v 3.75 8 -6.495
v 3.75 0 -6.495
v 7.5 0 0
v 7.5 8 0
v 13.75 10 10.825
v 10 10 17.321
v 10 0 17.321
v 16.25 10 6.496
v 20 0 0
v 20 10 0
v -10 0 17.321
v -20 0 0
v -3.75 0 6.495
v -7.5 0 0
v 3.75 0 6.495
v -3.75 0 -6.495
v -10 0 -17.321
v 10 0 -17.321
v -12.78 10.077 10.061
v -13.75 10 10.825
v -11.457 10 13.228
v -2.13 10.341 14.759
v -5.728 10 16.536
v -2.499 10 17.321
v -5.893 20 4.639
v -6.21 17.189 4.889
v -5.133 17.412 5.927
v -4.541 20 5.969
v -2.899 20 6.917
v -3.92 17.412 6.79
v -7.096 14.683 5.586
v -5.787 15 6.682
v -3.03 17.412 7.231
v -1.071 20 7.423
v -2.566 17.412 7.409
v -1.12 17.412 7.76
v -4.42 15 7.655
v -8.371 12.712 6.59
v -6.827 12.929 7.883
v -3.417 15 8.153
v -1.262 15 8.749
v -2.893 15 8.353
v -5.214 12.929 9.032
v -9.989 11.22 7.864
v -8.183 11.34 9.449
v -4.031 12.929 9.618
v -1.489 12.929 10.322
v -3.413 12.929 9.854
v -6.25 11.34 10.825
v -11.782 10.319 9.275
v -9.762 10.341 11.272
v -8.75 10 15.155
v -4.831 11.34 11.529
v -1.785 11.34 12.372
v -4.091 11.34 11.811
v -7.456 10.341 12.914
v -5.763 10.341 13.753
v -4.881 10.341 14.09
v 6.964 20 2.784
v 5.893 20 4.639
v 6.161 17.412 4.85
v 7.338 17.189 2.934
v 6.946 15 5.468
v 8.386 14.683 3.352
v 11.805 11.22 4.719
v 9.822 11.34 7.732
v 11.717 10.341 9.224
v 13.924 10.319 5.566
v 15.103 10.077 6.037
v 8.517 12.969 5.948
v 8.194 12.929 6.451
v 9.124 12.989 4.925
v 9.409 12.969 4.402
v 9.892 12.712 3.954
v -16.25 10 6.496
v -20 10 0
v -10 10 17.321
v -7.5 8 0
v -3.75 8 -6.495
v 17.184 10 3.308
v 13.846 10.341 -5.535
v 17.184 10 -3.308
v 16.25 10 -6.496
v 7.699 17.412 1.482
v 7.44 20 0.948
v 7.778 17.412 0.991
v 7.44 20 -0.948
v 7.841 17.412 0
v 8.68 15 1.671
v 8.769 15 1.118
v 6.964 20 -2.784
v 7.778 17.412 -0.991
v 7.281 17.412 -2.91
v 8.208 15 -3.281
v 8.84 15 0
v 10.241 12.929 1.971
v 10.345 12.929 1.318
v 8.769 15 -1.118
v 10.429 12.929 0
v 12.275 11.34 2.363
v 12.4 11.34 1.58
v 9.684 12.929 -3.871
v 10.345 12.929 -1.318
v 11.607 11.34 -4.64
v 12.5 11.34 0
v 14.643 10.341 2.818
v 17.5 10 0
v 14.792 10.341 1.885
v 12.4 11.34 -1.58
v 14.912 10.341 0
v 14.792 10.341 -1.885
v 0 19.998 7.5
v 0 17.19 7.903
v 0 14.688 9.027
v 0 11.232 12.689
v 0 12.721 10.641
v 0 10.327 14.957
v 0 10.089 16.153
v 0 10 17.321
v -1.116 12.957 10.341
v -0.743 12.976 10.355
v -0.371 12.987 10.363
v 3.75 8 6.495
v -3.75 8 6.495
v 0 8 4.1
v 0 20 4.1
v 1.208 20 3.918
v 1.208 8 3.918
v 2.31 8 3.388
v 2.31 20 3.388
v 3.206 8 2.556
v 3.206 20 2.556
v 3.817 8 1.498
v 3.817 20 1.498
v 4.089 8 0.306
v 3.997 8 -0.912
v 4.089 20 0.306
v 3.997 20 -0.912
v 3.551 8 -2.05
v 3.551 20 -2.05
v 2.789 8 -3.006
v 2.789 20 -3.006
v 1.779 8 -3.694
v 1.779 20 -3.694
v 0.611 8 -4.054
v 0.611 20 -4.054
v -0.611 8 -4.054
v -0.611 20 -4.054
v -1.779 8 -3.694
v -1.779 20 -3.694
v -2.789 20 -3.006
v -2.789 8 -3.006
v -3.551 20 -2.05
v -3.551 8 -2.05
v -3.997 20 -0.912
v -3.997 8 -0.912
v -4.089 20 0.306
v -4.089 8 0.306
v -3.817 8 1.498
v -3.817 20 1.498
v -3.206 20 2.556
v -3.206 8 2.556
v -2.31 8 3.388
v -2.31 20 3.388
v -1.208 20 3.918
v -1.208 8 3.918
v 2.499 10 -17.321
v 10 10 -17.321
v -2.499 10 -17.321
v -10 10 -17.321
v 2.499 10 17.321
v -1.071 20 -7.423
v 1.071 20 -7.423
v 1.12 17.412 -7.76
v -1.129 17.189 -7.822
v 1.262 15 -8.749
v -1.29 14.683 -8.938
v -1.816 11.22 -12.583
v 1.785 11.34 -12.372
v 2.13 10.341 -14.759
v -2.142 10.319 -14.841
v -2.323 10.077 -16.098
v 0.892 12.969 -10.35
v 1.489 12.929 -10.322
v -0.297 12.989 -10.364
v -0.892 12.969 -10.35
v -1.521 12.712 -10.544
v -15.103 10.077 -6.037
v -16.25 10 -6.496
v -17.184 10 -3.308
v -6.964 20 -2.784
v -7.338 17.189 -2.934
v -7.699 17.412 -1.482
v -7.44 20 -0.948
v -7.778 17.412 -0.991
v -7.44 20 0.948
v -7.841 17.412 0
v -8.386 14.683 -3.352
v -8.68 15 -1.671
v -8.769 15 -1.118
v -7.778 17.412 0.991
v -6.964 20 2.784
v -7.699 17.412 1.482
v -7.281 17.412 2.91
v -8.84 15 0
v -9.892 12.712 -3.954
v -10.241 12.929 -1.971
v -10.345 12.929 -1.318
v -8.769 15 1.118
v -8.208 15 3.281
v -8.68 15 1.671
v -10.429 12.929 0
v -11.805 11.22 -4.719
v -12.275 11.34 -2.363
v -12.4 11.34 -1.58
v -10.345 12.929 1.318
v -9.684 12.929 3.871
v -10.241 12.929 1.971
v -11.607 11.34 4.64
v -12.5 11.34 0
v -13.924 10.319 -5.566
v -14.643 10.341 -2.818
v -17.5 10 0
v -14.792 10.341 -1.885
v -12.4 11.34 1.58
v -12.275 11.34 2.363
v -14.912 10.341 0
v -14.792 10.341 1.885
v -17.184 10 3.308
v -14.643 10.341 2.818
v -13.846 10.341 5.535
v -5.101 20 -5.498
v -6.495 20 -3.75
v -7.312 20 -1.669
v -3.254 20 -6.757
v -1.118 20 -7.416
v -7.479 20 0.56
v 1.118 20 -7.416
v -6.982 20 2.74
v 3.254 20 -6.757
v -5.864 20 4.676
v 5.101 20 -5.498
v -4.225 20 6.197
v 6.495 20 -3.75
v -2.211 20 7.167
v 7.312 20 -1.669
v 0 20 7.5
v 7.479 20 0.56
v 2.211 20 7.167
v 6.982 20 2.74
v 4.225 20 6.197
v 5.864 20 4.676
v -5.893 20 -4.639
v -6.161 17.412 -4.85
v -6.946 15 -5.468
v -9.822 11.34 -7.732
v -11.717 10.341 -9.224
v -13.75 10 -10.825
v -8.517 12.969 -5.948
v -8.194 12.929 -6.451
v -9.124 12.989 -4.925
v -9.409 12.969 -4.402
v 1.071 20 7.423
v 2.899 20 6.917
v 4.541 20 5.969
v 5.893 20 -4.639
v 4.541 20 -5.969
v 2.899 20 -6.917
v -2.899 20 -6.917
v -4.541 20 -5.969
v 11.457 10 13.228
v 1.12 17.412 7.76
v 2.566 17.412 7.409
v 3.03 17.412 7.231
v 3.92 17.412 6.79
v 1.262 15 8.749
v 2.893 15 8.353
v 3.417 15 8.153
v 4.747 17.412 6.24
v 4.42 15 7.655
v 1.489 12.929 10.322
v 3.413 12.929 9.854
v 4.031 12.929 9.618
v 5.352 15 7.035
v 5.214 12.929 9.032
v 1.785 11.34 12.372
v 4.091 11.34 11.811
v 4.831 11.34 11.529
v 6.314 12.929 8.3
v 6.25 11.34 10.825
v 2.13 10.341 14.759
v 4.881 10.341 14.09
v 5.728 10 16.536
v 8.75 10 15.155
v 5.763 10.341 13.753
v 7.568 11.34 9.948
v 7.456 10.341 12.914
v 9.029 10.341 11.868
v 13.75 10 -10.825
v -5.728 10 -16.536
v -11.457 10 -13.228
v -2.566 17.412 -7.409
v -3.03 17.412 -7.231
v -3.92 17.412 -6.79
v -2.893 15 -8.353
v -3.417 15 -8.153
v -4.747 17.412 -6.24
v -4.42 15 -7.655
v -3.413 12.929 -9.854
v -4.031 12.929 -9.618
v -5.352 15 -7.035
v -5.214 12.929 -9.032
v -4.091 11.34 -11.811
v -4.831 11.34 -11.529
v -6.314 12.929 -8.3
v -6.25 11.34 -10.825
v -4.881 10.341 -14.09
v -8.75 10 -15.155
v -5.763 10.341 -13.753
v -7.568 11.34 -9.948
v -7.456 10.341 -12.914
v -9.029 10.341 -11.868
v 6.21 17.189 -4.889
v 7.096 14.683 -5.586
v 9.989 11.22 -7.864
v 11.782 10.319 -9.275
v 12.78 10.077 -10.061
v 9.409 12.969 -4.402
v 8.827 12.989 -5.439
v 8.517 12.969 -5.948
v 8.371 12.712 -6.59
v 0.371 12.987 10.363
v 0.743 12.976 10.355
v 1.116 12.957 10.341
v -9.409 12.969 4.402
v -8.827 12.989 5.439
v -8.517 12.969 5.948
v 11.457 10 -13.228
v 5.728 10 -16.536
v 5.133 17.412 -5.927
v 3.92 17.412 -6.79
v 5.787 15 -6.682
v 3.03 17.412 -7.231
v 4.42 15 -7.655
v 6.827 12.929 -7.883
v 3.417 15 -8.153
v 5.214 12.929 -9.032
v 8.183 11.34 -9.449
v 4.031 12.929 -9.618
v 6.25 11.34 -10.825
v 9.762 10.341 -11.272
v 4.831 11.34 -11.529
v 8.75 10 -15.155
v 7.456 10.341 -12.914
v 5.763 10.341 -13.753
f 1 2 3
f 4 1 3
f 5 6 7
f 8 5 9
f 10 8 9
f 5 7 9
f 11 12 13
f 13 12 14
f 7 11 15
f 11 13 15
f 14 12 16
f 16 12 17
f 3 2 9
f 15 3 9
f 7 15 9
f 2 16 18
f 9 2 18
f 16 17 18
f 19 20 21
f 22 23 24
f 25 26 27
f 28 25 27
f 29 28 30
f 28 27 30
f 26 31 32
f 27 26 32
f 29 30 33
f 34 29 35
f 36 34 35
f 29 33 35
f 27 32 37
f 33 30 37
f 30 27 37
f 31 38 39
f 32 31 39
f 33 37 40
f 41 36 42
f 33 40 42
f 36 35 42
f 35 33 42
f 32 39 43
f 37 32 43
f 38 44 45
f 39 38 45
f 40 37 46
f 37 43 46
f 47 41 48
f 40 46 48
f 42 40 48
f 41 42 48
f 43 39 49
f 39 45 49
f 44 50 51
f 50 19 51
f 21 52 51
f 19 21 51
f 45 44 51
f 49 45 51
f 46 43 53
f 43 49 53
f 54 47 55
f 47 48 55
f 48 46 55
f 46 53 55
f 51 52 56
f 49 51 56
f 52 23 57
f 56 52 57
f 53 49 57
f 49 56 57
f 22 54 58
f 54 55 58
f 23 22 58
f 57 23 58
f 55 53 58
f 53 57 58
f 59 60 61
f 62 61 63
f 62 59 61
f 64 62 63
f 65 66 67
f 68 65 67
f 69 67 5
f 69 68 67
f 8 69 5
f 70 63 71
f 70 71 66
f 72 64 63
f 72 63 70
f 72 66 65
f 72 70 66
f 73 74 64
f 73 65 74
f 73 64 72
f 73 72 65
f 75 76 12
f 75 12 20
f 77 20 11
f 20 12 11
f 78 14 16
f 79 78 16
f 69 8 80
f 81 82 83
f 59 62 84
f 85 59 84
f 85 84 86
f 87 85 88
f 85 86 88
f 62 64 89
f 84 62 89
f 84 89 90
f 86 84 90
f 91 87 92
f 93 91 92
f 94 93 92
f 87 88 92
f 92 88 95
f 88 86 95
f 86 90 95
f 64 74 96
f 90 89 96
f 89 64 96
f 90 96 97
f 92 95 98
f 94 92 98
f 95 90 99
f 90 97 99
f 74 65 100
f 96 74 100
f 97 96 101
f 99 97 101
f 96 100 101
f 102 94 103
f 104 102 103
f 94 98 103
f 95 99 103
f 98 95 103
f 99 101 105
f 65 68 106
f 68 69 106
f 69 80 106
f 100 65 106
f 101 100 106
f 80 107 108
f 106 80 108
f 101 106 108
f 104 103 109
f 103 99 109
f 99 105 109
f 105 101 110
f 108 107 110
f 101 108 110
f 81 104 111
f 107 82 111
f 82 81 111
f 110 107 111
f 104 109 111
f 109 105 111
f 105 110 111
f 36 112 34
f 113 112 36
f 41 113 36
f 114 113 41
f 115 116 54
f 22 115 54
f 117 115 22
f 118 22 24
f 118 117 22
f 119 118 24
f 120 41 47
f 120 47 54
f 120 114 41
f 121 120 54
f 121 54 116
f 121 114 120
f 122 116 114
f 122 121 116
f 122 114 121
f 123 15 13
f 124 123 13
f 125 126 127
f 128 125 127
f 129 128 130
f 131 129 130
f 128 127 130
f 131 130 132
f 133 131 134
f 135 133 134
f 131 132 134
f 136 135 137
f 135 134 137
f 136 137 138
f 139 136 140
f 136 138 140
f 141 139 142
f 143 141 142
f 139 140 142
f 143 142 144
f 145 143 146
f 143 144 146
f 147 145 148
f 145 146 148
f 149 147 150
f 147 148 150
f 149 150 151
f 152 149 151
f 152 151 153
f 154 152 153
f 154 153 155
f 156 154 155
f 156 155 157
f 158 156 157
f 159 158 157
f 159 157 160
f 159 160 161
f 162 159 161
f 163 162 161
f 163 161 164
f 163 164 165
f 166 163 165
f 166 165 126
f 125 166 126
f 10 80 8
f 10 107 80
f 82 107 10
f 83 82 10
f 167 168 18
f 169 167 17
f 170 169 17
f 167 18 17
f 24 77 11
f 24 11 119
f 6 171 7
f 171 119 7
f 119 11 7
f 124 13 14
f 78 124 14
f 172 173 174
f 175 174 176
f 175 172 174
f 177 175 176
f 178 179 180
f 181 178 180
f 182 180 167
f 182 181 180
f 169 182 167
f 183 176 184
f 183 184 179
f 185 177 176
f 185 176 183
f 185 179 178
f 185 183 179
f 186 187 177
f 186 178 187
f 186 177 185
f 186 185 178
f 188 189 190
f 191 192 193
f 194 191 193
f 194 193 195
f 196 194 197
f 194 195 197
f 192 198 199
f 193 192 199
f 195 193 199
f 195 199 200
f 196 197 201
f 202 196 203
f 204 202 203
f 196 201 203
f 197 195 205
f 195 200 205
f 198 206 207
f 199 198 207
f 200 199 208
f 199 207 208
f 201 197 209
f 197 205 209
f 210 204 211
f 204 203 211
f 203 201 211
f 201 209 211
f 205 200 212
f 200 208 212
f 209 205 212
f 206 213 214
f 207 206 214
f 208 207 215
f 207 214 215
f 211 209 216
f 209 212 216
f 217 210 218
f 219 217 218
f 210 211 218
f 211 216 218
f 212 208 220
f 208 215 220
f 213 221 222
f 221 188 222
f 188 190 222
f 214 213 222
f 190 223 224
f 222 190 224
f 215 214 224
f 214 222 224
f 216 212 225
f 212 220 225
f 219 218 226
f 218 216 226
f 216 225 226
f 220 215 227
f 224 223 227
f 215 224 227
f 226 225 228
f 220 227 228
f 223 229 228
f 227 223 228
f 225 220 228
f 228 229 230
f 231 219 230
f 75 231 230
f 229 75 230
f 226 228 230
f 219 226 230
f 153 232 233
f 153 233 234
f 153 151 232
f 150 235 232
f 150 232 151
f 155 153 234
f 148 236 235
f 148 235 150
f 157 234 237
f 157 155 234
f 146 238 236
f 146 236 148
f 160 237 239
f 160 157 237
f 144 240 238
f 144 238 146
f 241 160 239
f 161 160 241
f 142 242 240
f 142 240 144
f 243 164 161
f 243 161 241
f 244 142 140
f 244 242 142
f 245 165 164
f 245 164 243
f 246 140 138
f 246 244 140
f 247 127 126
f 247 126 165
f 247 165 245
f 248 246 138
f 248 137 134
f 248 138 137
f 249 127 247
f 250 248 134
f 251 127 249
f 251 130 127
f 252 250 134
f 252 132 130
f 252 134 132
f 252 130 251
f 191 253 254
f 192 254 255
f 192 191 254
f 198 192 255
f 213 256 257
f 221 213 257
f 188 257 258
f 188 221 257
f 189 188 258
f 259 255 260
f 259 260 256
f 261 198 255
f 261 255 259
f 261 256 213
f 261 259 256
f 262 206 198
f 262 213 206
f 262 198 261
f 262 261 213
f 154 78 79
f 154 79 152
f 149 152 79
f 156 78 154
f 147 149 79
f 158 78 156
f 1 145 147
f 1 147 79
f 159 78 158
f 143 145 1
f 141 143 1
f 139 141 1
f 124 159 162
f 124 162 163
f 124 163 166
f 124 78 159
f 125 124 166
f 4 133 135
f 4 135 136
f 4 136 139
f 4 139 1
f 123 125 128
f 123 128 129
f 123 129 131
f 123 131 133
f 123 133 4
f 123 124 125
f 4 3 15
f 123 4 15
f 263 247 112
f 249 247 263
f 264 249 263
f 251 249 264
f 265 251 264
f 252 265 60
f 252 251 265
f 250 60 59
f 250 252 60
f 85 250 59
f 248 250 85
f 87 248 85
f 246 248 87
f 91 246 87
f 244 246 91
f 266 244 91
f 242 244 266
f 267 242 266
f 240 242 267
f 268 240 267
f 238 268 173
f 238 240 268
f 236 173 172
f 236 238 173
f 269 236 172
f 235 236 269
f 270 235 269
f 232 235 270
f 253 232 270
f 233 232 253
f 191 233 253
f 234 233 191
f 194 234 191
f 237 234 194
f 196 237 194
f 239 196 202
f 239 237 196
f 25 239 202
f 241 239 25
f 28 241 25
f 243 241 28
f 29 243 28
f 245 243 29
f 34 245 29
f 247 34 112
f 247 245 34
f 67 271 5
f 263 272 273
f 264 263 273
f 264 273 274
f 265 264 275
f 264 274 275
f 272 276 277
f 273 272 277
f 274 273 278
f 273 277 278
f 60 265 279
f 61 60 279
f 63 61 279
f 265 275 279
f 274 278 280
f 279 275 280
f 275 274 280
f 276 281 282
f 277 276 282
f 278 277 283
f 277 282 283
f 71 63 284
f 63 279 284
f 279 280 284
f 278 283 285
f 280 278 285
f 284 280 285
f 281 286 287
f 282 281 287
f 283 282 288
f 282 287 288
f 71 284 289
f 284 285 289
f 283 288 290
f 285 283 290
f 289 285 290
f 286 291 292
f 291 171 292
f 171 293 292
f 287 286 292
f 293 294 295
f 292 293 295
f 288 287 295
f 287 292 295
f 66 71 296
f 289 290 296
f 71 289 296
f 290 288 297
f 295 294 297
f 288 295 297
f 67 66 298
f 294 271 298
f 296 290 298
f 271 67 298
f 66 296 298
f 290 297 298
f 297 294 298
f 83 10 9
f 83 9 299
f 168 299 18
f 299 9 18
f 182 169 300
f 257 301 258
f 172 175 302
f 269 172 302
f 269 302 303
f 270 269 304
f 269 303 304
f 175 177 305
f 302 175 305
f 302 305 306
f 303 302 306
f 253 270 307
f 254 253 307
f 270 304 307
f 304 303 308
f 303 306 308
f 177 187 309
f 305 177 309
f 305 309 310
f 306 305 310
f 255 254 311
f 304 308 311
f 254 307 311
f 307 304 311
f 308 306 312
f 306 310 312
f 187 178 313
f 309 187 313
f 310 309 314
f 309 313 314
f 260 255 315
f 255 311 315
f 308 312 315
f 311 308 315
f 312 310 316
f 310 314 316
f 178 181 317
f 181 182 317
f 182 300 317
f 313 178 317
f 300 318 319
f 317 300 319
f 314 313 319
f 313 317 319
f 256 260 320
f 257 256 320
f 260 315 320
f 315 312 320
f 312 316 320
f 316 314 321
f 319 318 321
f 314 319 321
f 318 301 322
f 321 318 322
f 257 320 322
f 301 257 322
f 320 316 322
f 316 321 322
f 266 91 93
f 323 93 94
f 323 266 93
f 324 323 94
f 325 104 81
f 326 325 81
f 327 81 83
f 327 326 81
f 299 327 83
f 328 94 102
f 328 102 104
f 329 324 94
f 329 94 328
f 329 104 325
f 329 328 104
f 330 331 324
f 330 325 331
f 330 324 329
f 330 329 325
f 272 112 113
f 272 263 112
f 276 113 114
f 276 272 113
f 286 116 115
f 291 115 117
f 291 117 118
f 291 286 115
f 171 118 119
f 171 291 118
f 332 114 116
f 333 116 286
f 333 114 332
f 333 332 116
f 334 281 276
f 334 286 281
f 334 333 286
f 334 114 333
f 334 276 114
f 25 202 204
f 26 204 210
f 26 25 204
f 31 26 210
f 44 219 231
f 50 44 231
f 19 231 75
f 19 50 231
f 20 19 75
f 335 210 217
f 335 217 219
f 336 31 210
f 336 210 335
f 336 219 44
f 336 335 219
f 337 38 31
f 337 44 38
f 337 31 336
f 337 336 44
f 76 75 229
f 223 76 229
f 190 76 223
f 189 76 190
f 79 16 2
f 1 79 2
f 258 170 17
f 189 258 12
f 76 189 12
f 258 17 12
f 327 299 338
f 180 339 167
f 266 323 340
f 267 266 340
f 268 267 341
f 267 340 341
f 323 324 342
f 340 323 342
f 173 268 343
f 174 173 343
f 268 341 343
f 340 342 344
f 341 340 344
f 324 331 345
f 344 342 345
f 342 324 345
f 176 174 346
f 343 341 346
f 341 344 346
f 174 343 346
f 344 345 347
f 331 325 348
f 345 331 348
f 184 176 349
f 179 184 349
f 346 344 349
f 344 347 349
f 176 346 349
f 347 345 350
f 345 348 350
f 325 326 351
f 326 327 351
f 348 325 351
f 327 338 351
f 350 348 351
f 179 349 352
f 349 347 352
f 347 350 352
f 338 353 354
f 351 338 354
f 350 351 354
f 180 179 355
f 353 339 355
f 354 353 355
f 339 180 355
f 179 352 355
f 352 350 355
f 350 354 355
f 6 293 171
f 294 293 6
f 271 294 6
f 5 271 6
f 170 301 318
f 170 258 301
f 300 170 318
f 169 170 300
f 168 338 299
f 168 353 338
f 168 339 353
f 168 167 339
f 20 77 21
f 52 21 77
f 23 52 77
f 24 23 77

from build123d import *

# Parameters (mm, degrees)
BOSS_EXTRUDE1_DEPTH = 10
SKETCH2_R           = 4.1
CUT_EXTRUDE1_DEPTH  = 29.284271247
CUT_EXTRUDE2_DEPTH  = 8
BOSS_EXTRUDE2_START = 10
SKETCH4_R           = 7.5
SKETCH4_R_2         = 4.1
BOSS_EXTRUDE2_DEPTH = 10
FILLET1_R           = 10


with BuildPart() as part:
    # Sketch1 → Boss-Extrude1 (new body)
    with BuildSketch(Plane(origin=(0, 0, 0), x_dir=(1, 0, 0), z_dir=(0, 1, 0))):
        Polygon((-10, 17.320508076), (-20, 0), (-10, -17.320508076), (10, -17.320508076), (20, 0), (10, 17.320508076), align=None)
    extrude(amount=BOSS_EXTRUDE1_DEPTH)

    # Sketch2 → Cut-Extrude1 (cut, through all)
    with BuildSketch(Plane(origin=(0, 10, 0), x_dir=(1, 0, 0), z_dir=(0, 1, 0))):
        with Locations(Location((0, 0, 0), (0, 0, 270))):
            Circle(SKETCH2_R)
    extrude(amount=-CUT_EXTRUDE1_DEPTH, mode=Mode.SUBTRACT)

    # Sketch3 → Cut-Extrude2 (cut)
    with BuildSketch(Plane.XZ):
        Polygon((7.5, 0), (3.75, 6.495190528), (-3.75, 6.495190528), (-7.5, 0), (-3.75, -6.495190528), (3.75, -6.495190528), align=None)
    extrude(amount=-CUT_EXTRUDE2_DEPTH, mode=Mode.SUBTRACT)

    # Sketch4 → Boss-Extrude2 (add)
    with BuildSketch(Plane(origin=(0, 10, 0), x_dir=(1, 0, 0), z_dir=(0, 1, 0)).offset(BOSS_EXTRUDE2_START)):
        with Locations(Location((0, 0, 0), (0, 0, 270))):
            Circle(SKETCH4_R)
        with Locations(Location((0, 0, 0), (0, 0, 270))):
            Circle(SKETCH4_R_2, mode=Mode.SUBTRACT)
    extrude(amount=-BOSS_EXTRUDE2_DEPTH)

    # Fillet1
    fillet1_edges = [part.edges().sort_by_distance(p)[0] for p in [
        (0, 10, -7.5),
    ]]
    fillet(fillet1_edges, radius=FILLET1_R - 0.0001)  # a hair under: the kernel refuses the full size


solid = part.part
